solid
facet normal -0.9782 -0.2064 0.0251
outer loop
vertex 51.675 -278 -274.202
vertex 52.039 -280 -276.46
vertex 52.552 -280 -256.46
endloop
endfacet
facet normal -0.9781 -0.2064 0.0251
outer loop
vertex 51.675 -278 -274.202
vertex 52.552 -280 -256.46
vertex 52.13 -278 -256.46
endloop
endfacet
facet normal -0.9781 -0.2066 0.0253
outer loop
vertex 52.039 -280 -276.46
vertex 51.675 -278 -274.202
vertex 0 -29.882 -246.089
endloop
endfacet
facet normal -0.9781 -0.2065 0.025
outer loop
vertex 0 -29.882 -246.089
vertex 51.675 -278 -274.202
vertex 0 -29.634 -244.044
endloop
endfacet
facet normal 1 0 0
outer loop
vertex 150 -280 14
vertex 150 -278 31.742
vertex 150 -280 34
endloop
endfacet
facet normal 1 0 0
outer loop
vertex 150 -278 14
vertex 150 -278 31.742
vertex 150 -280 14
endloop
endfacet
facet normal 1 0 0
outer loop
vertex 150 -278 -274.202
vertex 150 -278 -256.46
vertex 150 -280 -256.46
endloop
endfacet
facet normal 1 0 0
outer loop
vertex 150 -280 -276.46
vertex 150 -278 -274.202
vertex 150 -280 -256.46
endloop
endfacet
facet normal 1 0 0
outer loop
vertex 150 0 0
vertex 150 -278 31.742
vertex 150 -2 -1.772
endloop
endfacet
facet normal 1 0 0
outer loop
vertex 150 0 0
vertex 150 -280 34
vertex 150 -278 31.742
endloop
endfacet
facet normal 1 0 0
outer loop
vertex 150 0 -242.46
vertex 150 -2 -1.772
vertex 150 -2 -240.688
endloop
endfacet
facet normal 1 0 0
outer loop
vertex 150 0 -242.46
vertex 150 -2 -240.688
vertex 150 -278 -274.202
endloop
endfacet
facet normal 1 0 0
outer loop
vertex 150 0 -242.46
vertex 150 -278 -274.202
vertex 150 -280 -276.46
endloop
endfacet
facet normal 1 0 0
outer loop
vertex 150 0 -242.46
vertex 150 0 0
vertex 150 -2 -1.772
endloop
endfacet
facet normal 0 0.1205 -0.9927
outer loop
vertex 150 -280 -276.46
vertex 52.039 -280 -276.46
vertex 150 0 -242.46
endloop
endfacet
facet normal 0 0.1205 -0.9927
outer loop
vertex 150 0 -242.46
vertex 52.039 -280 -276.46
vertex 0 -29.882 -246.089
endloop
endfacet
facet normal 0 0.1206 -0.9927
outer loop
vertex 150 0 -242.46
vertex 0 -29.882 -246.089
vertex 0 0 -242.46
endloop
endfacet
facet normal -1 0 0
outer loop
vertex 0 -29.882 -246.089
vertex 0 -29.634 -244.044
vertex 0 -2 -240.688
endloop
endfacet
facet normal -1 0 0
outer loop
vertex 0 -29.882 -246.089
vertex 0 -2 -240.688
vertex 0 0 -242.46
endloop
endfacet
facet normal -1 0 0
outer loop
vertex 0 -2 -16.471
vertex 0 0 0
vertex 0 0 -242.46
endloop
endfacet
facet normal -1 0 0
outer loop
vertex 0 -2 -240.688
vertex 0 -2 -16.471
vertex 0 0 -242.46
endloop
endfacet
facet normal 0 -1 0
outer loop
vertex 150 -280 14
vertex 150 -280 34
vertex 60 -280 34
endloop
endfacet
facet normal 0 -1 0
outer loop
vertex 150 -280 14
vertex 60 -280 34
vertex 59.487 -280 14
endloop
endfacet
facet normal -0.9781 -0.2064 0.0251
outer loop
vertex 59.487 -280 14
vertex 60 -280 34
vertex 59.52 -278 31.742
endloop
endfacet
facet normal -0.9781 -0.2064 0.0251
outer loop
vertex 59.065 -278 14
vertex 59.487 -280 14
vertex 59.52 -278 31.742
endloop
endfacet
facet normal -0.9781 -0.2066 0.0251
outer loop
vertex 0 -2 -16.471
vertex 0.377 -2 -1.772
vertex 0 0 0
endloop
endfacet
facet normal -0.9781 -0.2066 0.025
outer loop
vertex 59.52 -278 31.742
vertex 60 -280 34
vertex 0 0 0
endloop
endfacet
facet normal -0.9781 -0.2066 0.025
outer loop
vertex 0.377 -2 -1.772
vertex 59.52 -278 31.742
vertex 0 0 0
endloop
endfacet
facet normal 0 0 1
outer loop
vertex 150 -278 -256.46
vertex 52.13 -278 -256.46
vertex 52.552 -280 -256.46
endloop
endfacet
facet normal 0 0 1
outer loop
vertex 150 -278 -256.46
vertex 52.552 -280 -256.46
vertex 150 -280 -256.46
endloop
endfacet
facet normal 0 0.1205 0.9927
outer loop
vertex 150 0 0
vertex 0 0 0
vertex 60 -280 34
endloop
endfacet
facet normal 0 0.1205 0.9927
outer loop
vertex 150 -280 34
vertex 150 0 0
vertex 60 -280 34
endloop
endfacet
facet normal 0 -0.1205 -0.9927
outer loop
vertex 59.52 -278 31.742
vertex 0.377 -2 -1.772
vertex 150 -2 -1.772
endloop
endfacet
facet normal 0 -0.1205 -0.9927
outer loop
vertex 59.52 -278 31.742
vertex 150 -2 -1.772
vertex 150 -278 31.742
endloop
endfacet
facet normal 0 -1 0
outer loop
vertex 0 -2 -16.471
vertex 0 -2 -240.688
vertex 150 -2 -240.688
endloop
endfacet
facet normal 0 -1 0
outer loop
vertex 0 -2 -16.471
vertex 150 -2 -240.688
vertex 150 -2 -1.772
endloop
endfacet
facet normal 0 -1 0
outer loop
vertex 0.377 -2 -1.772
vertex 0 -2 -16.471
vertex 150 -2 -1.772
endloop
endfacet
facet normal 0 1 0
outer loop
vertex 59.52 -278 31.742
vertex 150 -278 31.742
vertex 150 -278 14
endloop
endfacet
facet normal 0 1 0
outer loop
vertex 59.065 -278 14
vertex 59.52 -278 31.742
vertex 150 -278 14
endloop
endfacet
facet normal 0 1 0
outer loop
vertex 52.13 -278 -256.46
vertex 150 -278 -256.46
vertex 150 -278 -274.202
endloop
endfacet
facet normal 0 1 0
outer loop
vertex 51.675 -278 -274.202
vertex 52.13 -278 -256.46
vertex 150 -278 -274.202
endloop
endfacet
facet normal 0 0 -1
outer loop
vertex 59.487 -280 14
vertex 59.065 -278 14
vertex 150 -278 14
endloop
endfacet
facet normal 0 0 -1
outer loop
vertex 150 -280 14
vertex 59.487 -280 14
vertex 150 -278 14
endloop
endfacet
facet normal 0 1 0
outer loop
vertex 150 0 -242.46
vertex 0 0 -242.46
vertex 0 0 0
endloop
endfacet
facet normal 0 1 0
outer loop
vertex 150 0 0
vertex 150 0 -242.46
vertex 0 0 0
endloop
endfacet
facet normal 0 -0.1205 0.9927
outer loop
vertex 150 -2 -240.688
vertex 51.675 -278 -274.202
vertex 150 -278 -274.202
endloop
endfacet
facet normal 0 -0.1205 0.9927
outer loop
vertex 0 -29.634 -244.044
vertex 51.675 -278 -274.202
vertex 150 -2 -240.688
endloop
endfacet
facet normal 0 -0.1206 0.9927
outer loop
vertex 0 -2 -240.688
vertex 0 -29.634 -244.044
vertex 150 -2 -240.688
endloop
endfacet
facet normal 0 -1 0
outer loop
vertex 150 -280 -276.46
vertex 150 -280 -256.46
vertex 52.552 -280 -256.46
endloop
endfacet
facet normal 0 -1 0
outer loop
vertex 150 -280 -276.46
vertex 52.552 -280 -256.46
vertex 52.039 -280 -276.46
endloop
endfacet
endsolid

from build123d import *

# Parameters (mm, degrees)
EXTRUDE_1_DEPTH     = 150
CUT_EXTRUDE_1_DEPTH = 309.196154086
CUT_EXTRUDE_3_REACH = 4
SKETCH_3_W          = 150
SKETCH_3_H          = 270.46


with BuildPart() as part:
    # 草图1 → 凸台-拉伸1 (new body)
    with BuildSketch(Plane(origin=(0, 0, 0), x_dir=(0, 0, -1), z_dir=(1, 0, 0))):
        Polygon((0, 0), (-34, -280), (276.46, -280), (242.46, 0), align=None)
        Polygon((240.688166201, -2), (1.771833799, -2), (-31.742451915, -278), (274.202451915, -278), align=None, mode=Mode.SUBTRACT)
    extrude(amount=EXTRUDE_1_DEPTH)

    # 草图2 → 切除-拉伸1 (cut, through all)
    with BuildSketch(Plane(origin=(0, 0, 0), x_dir=(1, 0, 0), z_dir=(0, 0.120543125, 0.992708091))):
        Polygon((0, 0), (0, -282.056731882), (60, -282.056731882), align=None)
    extrude(amount=-CUT_EXTRUDE_1_DEPTH, mode=Mode.SUBTRACT)

    # 草图3 → 切除-拉伸3 (cut, up to next)
    with BuildSketch(Plane(origin=(0, -278, 0), x_dir=(1, 0, 0), z_dir=(0, 1, 0)), mode=Mode.PRIVATE) as cut_extrude_3_sk1:
        with Locations((75, 121.23)):
            Rectangle(SKETCH_3_W, SKETCH_3_H)
    cut_extrude_3_tool1 = extrude(cut_extrude_3_sk1.sketch, amount=-CUT_EXTRUDE_3_REACH, mode=Mode.PRIVATE) & part.part
    add(cut_extrude_3_tool1.solids().sort_by_distance((75, -278, -121.23))[0], mode=Mode.SUBTRACT)


solid = part.part
